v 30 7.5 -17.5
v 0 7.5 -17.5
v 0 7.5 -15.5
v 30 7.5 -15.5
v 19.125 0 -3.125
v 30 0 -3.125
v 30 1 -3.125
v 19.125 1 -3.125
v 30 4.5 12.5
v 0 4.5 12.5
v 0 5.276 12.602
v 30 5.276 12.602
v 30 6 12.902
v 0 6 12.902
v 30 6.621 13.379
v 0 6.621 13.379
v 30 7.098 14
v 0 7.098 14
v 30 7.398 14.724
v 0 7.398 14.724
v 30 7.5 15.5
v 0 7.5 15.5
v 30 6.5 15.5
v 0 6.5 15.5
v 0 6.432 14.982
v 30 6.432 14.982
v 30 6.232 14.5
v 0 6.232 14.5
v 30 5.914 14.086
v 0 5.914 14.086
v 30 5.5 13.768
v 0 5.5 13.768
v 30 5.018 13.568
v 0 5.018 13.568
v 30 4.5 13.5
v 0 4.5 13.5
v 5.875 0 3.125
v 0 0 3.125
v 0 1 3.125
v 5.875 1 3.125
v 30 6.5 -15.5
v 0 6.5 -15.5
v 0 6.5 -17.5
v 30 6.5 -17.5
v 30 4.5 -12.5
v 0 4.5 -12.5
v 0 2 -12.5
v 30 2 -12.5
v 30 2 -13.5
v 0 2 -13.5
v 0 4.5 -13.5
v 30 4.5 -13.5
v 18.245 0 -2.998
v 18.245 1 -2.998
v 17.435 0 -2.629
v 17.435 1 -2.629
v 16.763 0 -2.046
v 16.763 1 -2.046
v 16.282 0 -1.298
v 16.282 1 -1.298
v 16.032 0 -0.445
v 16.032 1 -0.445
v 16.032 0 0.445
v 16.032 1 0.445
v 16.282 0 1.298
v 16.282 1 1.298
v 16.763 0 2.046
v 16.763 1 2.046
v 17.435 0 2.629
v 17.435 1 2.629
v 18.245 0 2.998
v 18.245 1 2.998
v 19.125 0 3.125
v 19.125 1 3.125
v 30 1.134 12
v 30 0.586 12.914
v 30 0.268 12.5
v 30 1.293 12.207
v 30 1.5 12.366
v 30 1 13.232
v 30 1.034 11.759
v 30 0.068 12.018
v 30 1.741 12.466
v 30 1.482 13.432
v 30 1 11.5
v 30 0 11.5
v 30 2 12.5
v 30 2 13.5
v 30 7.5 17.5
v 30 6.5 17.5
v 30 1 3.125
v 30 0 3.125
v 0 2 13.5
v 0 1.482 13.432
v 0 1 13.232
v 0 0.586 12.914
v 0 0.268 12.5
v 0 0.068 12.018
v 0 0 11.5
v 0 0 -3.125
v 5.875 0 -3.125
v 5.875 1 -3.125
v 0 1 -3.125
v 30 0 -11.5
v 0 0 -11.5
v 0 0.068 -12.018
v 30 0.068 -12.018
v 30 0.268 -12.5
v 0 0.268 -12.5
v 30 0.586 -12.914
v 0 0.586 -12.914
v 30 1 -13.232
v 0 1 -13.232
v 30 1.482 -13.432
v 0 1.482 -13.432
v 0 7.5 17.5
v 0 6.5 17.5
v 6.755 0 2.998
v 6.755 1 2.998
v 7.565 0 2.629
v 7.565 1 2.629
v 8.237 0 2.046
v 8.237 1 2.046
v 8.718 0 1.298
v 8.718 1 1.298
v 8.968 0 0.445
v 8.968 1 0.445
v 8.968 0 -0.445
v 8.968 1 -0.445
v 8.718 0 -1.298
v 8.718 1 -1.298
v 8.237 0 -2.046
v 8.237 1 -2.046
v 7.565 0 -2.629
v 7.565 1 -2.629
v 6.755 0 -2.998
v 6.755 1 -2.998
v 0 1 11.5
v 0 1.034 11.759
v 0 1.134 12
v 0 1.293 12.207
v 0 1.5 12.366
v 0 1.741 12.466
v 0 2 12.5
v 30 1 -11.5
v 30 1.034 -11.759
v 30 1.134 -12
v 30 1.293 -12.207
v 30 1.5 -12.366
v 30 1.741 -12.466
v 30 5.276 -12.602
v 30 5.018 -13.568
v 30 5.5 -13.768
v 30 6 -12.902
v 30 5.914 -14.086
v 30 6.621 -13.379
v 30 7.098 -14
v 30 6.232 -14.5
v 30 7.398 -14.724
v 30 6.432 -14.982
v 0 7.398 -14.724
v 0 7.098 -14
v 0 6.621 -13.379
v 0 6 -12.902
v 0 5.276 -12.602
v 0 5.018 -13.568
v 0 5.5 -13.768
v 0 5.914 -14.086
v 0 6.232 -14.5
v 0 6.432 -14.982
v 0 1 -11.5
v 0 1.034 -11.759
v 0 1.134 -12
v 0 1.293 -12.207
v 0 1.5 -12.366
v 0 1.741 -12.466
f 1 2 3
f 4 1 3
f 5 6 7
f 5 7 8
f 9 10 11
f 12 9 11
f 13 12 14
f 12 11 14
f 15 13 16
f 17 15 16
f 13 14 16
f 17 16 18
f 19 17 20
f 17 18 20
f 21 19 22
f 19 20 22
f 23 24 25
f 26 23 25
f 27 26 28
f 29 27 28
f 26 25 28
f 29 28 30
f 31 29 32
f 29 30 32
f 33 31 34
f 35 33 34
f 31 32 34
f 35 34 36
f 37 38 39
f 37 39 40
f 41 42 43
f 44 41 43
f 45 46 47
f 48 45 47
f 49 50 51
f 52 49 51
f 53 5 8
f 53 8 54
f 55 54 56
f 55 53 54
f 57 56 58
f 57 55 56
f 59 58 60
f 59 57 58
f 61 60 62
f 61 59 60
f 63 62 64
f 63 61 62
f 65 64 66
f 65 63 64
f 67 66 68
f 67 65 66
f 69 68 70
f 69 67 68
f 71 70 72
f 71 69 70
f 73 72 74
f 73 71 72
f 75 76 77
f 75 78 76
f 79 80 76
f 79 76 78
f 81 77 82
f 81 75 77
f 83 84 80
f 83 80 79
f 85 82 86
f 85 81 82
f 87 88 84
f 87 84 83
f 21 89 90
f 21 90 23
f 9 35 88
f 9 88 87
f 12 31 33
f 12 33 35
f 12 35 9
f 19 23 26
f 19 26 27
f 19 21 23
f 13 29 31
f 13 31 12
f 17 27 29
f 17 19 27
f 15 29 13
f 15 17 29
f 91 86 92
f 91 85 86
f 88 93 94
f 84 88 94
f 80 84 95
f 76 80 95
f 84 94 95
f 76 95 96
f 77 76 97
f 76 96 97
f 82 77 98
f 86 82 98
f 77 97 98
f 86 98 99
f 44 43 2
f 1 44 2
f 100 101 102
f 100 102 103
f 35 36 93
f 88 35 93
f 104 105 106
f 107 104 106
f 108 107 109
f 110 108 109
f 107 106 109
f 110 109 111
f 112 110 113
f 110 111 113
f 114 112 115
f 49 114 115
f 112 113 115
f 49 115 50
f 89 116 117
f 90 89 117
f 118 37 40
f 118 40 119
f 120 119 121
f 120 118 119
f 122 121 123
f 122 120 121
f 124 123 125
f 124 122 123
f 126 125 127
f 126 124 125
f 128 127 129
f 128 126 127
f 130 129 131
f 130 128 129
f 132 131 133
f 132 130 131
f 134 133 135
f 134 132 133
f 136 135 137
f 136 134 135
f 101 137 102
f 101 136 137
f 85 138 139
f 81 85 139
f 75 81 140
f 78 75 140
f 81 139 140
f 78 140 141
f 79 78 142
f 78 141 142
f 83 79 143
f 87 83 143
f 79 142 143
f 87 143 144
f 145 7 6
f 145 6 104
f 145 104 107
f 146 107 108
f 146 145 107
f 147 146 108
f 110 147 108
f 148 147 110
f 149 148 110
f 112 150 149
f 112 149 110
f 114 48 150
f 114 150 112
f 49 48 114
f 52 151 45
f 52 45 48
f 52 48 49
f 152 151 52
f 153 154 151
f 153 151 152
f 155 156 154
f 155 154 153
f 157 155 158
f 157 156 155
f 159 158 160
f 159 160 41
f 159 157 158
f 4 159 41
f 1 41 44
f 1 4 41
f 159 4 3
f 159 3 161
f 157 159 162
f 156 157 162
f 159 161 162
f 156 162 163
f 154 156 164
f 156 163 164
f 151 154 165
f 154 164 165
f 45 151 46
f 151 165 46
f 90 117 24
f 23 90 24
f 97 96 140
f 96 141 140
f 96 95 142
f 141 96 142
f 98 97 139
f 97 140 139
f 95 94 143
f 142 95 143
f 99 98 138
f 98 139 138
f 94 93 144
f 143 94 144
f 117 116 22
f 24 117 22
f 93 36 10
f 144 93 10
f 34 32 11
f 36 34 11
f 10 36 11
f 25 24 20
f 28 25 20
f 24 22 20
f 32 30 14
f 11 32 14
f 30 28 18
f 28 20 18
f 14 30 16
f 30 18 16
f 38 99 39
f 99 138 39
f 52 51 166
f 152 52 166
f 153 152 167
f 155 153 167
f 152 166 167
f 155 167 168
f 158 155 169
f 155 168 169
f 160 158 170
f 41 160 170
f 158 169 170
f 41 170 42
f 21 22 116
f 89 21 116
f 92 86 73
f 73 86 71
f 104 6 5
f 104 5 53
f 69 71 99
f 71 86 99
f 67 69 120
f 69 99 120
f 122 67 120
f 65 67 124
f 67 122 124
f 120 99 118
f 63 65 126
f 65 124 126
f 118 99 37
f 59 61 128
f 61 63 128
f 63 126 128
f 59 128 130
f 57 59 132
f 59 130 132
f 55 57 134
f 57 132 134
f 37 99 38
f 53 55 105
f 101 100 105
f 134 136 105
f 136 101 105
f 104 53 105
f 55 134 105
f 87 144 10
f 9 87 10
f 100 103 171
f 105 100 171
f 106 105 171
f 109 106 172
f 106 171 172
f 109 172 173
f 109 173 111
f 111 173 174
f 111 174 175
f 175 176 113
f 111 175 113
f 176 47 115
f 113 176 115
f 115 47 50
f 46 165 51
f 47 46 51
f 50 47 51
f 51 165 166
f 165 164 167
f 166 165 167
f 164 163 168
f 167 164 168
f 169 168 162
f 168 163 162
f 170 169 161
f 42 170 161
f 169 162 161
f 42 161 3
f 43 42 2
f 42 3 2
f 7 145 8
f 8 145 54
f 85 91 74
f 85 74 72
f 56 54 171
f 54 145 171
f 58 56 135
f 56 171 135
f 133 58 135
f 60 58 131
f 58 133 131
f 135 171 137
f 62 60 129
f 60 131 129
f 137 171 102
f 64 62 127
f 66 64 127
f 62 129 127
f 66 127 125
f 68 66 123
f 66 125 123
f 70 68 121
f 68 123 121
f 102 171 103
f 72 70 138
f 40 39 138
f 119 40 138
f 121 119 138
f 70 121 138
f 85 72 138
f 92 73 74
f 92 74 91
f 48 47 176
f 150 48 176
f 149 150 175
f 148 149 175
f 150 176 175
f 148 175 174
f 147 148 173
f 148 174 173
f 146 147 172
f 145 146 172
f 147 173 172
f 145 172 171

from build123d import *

# Parameters (mm, degrees)
EXTRUDE_THIN1_DEPTH = 30
CUT_EXTRUDE1_DEPTH  = 1
LPATTERN1_COUNT     = 2
LPATTERN1_PITCH     = 25


with BuildPart() as part:
    # Sketch1 → Extrude-Thin1 (new body)
    with BuildSketch(Plane(origin=(0, 0, 0), x_dir=(0, 0, -1), z_dir=(1, 0, 0))):
        with BuildLine():
            Line((-17.5, 6.5), (-15.5, 6.5))
            ThreePointArc((-15.5, 6.5), (-14.085786438, 5.914213562), (-13.5, 4.5))
            Line((-13.5, 4.5), (-13.5, 2))
            ThreePointArc((-13.5, 2), (-12.914213562, 0.585786438), (-11.5, 0))
            Line((-11.5, 0), (11.5, 0))
            ThreePointArc((11.5, 0), (12.914213562, 0.585786438), (13.5, 2))
            Line((13.5, 2), (13.5, 4.5))
            ThreePointArc((13.5, 4.5), (14.085786438, 5.914213562), (15.5, 6.5))
            Line((15.5, 6.5), (17.5, 6.5))
            Line((17.5, 6.5), (17.5, 7.5))
            Line((17.5, 7.5), (15.5, 7.5))
            ThreePointArc((15.5, 7.5), (13.378679656, 6.621320344), (12.5, 4.5))
            Line((12.5, 4.5), (12.5, 2))
            ThreePointArc((12.5, 2), (12.207106781, 1.292893219), (11.5, 1))
            Line((11.5, 1), (-11.5, 1))
            ThreePointArc((-11.5, 1), (-12.207106781, 1.292893219), (-12.5, 2))
            Line((-12.5, 2), (-12.5, 4.5))
            ThreePointArc((-12.5, 4.5), (-13.378679656, 6.621320344), (-15.5, 7.5))
            Line((-15.5, 7.5), (-17.5, 7.5))
            Line((-17.5, 7.5), (-17.5, 6.5))
        make_face()
    extrude(amount=EXTRUDE_THIN1_DEPTH)

    # Sketch2 → Cut-Extrude1 (cut)
    with BuildSketch(Plane.XZ):
        with BuildLine():
            Line((-5.875, 3.125), (5.875, 3.125))
            ThreePointArc((5.875, 3.125), (9, 0), (5.875, -3.125))
            Line((5.875, -3.125), (-5.875, -3.125))
            ThreePointArc((-5.875, -3.125), (-9, 0), (-5.875, 3.125))
        make_face()
    cut_extrude1 = extrude(amount=-CUT_EXTRUDE1_DEPTH, mode=Mode.SUBTRACT)

    # LPattern1: Cut-Extrude1 ×2
    with Locations(*[(i * LPATTERN1_PITCH, 0, 0) for i in range(1, LPATTERN1_COUNT)]):
        add(cut_extrude1, mode=Mode.SUBTRACT)


solid = part.part
